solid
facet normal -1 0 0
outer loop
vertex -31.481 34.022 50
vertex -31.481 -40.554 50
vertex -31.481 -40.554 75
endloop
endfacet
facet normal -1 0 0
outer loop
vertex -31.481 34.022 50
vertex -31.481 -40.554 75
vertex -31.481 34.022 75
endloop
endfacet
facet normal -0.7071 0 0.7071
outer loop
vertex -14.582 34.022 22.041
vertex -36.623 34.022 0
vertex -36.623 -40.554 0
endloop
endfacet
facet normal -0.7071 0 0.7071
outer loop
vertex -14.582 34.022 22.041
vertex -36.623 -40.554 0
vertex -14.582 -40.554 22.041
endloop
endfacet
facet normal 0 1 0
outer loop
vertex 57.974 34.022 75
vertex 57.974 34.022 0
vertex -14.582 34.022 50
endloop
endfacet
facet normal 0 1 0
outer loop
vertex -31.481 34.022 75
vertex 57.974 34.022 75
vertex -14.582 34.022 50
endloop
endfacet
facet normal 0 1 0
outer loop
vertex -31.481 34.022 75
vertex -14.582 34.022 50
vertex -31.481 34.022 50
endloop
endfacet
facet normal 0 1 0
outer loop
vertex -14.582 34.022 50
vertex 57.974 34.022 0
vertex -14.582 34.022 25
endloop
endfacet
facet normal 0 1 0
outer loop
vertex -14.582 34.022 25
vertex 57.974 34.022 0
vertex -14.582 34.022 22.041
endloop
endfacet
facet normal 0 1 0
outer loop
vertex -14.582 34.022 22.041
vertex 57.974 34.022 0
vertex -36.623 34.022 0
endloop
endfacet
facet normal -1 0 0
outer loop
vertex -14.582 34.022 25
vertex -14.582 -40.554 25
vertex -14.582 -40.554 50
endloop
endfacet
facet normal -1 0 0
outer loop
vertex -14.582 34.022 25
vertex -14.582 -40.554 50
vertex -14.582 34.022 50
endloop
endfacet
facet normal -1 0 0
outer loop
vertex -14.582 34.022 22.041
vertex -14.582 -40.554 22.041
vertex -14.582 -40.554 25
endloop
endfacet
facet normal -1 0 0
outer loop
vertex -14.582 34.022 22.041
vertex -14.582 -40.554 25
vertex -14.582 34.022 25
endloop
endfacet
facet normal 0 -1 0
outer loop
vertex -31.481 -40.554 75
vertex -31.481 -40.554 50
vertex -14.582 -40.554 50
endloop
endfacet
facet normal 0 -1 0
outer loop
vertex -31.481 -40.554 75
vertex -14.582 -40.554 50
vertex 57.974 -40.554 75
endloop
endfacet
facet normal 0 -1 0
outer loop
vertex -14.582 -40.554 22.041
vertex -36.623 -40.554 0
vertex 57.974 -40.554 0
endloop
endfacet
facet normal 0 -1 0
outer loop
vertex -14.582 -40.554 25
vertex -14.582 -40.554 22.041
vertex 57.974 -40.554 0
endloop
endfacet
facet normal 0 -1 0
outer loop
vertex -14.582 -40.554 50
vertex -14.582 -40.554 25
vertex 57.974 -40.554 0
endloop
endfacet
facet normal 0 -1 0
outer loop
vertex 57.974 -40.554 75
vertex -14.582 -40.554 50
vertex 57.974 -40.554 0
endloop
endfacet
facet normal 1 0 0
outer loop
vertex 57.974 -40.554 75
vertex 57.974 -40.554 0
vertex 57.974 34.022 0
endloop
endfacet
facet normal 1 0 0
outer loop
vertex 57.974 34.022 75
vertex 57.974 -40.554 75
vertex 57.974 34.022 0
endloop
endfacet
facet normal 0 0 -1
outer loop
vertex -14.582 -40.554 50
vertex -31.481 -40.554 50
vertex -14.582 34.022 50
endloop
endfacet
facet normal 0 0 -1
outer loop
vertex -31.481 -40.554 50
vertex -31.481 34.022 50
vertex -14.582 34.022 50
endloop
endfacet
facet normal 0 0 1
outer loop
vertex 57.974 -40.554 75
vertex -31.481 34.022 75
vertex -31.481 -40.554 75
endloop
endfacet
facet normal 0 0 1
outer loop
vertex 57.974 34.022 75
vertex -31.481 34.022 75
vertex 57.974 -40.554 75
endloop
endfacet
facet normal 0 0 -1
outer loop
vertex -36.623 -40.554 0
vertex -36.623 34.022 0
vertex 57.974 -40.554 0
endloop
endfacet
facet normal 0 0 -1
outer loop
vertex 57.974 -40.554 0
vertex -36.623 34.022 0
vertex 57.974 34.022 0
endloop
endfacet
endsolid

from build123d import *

# Parameters (mm, degrees)
F0_W        = 109.5967777073
F0_H        = 74.5766162872
F1_DEPTH    = 25
F2_W        = 72.5555187091
F2_H        = 74.5766162872
F3_DEPTH    = 25
F4_W        = 72.5555187091
F4_H        = 74.5766162872
F4_W_2      = 16.8990129605
F5_DEPTH    = 25
F6_T4_DEPTH = 280.3112553245


# Not quite as in the source:
# - a fillet or chamfer that OpenCascade refuses, or shapes differently, is made with other operations: its cross-section is extruded or revolved along the edge and cut away or added


with BuildPart() as f1:
    # F0 (on Top) → F1 (new body)
    with BuildSketch(Plane.XY):
        with Locations((3.1754020602, -3.2661296427)):
            Rectangle(F0_W, F0_H)
    extrude(amount=F1_DEPTH)

    # F2 (on face) → F3 (join)
    with BuildSketch(Plane.XY.offset(25)):
        with Locations((21.6960315593, -3.2661296427)):
            Rectangle(F2_W, F2_H)
    extrude(amount=F3_DEPTH)

    # F4 (on face) → F5 (join)
    with BuildSketch(Plane.XY.offset(50)):
        with Locations((21.6960315593, -3.2661296427)):
            Rectangle(F4_W, F4_H)
        with Locations((-23.0312342755, -3.2661296427)):
            Rectangle(F4_W_2, F4_H)
    extrude(amount=F5_DEPTH)

    # F6: chamfer of 40 on 1 edges, made by hand


with BuildPart() as f6_tool2:
    # F6_s3 → F6_t4 (new body)
    with BuildSketch(Plane.XZ.offset(-136.8894980195)):
        Polygon((-51.6229867935, -15), (-11.6229867935, 25), (-51.6229867935, 25), align=None)
    extrude(amount=F6_T4_DEPTH)

    split(bisect_by=Plane.YZ.offset(-14.5817277953), keep=Keep.BOTTOM)


with BuildPart() as f1_1:
    add(f1.part)

    # F6_t1: cut F6_tool2
    add(f6_tool2.part, mode=Mode.SUBTRACT)


solid = f1_1.part
